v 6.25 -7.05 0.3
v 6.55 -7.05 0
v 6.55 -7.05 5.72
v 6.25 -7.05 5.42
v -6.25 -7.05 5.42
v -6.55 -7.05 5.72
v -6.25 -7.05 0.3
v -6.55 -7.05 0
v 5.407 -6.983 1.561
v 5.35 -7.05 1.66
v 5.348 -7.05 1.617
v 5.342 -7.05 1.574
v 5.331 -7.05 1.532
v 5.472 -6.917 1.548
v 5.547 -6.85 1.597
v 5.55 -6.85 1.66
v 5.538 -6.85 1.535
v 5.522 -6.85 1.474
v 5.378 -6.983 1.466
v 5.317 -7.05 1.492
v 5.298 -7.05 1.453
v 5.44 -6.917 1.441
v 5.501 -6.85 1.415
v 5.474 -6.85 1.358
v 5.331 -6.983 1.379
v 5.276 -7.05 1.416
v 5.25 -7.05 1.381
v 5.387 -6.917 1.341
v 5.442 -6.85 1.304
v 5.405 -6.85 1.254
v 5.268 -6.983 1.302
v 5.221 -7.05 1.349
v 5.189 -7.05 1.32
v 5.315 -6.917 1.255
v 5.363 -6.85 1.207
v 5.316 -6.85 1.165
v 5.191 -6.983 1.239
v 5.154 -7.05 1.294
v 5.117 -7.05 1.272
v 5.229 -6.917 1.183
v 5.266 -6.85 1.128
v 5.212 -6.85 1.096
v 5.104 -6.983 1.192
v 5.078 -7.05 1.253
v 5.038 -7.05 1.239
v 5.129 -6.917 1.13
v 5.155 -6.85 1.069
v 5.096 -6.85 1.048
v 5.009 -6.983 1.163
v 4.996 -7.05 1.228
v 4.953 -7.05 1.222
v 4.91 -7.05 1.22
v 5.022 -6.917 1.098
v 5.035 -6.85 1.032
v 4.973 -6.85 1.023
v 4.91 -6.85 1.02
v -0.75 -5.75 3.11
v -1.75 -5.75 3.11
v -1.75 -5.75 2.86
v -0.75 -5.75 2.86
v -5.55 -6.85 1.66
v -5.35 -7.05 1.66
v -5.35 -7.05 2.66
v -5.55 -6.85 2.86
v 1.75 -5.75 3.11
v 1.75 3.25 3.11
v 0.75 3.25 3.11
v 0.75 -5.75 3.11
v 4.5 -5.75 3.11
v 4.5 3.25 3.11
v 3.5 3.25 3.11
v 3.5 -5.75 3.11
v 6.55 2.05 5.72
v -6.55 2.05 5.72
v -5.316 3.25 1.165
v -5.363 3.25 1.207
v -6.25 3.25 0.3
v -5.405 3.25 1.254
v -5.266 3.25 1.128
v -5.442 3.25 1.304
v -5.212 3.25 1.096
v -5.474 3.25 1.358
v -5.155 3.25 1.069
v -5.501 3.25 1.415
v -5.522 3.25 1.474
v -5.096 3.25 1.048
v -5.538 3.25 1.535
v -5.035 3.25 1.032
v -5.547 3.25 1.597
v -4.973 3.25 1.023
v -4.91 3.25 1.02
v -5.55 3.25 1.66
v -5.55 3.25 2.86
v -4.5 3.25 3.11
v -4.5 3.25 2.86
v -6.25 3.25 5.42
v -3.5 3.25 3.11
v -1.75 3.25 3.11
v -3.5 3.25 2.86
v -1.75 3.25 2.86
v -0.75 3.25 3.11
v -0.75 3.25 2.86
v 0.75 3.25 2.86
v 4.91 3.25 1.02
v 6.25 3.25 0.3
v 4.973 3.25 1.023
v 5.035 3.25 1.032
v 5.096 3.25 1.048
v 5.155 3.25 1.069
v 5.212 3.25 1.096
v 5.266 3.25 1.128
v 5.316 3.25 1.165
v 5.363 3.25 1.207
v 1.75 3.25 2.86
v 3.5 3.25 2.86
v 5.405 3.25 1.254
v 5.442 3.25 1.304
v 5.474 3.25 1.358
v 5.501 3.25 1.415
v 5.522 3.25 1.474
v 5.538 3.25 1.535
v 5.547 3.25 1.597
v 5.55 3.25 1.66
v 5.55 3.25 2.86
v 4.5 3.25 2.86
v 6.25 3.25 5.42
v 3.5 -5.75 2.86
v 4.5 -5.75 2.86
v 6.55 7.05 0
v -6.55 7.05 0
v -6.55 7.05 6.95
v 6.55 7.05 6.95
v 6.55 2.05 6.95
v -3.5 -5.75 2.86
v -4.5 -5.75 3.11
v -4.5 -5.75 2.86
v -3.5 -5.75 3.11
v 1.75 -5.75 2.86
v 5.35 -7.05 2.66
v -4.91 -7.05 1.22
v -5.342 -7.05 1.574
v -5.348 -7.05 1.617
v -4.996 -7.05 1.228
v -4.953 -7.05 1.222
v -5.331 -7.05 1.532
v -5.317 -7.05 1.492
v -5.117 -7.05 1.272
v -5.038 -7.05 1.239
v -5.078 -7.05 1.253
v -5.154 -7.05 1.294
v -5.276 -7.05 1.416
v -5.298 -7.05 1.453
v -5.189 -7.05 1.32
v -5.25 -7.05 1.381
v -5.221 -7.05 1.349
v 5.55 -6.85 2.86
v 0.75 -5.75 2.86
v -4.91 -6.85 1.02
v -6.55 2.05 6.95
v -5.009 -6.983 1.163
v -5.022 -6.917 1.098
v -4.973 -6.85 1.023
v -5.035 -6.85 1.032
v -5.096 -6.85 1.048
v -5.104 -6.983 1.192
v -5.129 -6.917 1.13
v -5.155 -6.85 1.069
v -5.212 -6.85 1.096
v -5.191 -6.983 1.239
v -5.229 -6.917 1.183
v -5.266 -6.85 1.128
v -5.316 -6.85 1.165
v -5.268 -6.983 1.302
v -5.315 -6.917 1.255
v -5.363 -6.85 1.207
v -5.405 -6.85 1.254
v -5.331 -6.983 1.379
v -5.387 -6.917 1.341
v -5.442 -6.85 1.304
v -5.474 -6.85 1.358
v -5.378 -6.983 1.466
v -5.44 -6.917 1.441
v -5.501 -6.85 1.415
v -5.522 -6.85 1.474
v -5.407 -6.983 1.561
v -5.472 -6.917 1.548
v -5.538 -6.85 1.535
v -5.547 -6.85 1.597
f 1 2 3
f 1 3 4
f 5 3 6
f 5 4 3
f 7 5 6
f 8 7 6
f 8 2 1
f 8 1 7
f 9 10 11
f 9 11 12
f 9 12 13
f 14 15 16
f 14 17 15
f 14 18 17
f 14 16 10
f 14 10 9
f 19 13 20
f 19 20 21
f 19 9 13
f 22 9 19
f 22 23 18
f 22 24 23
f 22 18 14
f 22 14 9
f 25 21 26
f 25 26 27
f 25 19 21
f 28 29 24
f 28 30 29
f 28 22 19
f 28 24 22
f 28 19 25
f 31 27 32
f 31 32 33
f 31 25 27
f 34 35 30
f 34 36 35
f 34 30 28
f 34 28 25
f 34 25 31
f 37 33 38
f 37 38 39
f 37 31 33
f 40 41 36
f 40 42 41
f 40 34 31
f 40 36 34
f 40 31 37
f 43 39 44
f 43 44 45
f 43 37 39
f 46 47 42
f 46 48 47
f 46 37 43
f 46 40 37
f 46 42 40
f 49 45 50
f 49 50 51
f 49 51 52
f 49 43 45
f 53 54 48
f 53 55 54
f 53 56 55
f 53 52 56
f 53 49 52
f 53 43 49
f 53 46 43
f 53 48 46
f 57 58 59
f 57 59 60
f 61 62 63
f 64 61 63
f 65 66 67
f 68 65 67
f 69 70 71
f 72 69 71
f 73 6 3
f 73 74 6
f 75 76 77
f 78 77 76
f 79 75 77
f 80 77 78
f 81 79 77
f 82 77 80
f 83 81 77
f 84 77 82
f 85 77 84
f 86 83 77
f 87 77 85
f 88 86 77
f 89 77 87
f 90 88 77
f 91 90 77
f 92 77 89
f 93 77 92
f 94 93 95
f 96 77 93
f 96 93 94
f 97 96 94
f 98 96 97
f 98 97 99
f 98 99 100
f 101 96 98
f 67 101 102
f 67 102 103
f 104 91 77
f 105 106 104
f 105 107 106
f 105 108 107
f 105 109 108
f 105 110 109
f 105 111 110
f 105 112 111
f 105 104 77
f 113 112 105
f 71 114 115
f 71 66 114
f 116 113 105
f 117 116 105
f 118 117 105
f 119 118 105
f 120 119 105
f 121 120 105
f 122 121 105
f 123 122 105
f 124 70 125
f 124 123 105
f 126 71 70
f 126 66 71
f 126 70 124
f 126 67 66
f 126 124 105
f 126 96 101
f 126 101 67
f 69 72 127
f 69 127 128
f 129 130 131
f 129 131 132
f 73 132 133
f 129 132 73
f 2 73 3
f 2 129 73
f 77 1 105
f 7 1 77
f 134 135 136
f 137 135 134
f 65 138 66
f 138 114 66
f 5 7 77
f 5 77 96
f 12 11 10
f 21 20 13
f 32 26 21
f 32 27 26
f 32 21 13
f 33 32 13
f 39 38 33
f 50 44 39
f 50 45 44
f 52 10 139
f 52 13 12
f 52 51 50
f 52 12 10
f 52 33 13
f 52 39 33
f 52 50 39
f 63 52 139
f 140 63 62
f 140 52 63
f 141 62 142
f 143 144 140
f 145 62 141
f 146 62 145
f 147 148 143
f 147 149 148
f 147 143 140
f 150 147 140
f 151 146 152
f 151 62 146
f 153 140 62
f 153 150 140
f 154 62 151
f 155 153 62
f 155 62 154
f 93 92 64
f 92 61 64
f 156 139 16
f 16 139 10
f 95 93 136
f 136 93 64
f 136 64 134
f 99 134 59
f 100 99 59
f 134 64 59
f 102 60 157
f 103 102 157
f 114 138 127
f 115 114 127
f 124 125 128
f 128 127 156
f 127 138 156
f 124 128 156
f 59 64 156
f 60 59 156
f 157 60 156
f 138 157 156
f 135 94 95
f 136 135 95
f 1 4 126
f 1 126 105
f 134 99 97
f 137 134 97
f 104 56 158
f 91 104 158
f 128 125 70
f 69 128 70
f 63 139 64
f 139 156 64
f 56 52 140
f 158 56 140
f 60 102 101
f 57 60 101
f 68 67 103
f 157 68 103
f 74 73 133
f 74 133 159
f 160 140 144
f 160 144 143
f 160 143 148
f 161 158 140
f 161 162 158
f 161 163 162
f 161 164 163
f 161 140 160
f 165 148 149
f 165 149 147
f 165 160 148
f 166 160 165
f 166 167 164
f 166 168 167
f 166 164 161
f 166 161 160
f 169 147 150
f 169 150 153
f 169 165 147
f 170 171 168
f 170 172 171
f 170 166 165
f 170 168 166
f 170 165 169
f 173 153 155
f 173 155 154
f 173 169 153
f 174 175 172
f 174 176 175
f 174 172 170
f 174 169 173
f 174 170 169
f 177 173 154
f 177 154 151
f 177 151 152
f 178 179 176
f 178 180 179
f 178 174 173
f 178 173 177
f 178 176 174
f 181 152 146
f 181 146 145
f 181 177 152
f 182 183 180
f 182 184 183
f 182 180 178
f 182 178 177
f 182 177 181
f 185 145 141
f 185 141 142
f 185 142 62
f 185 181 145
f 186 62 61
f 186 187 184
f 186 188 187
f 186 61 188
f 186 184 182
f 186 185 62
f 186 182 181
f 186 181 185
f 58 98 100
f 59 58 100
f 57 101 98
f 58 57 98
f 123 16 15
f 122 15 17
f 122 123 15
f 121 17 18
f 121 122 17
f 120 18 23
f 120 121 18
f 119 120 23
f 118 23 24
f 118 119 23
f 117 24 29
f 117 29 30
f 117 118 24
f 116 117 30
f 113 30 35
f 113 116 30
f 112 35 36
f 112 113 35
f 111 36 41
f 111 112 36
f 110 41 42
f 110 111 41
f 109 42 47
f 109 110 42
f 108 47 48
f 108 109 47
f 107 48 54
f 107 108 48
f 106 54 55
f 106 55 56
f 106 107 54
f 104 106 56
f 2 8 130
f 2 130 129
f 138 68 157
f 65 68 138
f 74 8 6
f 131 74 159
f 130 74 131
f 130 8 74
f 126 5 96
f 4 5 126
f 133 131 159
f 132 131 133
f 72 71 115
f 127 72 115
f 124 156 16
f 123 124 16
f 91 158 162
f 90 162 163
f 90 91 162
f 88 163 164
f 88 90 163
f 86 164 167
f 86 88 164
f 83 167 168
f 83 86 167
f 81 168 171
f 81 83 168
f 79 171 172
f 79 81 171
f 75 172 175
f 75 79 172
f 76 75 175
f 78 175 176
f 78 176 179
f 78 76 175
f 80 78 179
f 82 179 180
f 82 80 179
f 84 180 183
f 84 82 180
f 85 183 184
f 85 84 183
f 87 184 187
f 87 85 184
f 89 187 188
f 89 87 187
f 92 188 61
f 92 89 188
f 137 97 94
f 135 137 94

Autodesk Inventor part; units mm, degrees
ref_plane "YZ Plane" through (0, 0, 0) normal (1, 0, 0) x (0, 1, 0)
ref_plane "XZ Plane" through (0, 0, 0) normal (0, 1, 0) x (-1, 0, 0)
ref_plane "XY Plane" through (0, 0, 0) normal (0, 0, 1) x (1, 0, 0)
sketch "Sketch1" plane through (0, 0, 0) normal (0, 0, 1) x (1, 0, 0)
  line L0 (-6.55, 7.05) -> (6.55, 7.05)
  line L1 (6.55, 7.05) -> (6.55, -7.05)
  line L2 (6.55, -7.05) -> (-6.55, -7.05)
  line L3 (-6.55, -7.05) -> (-6.55, 7.05)
  point P0 (0, 0)
  point P1 (-6.55, 0)
  point P2 (0, 7.05)
  dimension "d0" = 13.1
  dimension "d1" = 14.1
extrude "Extrusion1" add sketch "Sketch1" along normal blind 5.72
sketch "Sketch2" plane through (0, 0, 5.72) normal (0, 0, 1) x (1, 0, 0)
  line L0 (6.55, 7.05) -> (6.55, -7.05) projected
  line L1 (-6.55, 7.05) -> (6.55, 7.05)
  line L2 (6.55, 7.05) -> (6.55, 2.05)
  line L3 (6.55, 2.05) -> (-6.55, 2.05)
  line L4 (-6.55, 2.05) -> (-6.55, 7.05)
  point P0 (0, 0)
  dimension "d4" = 5
extrude "Extrusion2" add sketch "Sketch2" along normal blind 1.23
sketch "Sketch3" plane through (-6.55, -7.05, 0) normal (0, -1, 0) x (1, 0, 0)
  line L0 (13.1, 5.72) -> (0, 5.72) projected
  line L1 (0, 0) -> (0, 5.72) projected
  line L2 (13.1, 0) -> (0, 0) projected
  line L3 (13.1, 0) -> (13.1, 5.72) projected
  line L4 (0.3, 5.42) -> (12.8, 5.42)
  line L5 (12.8, 5.42) -> (12.8, 0.3)
  line L6 (12.8, 0.3) -> (0.3, 0.3)
  line L7 (0.3, 0.3) -> (0.3, 5.42)
  line L8 (1, 2.86) -> (12.1, 2.86)
  line L9 (12.1, 2.86) -> (12.1, 1.02)
  line L10 (12.1, 1.02) -> (1, 1.02)
  line L11 (1, 1.02) -> (1, 2.86)
  line L12 (2.05, 2.86) -> (3.05, 2.86)
  line L13 (4.8, 2.86) -> (5.8, 2.86)
  line L14 (7.3, 2.86) -> (8.3, 2.86)
  line L15 (10.05, 2.86) -> (11.05, 2.86)
  point P0 (6.55, 0)
  dimension "d7" = 0.3
  dimension "d9" = 5.72
  dimension "d10" = 5.12
  dimension "d11" = 0.7
  dimension "d13" = 1.84
  dimension "d14" = 0.7
  dimension "d17" = 2.56
extrude "Extrusion3" cut sketch "Sketch3" against normal blind 10.3 contours L4 L5 L6 L7
fillet "Fillet3" radius 0.64 1 edges at (5.55, -1.9, 1.02)
fillet "Fillet4" radius 0.64 1 edges at (-5.55, -1.9, 1.02)
chamfer "Chamfer1" distance 0.2 angle 45 5 edges at (5.55, -7.05, 2.26) (5.3625, -7.05, 1.2075) (0, -7.05, 1.02) (-5.3625, -7.05, 1.2075) (-5.55, -7.05, 2.26)
chamfer "Chamfer7" distance 0.2 angle 45 1 edges at (0, -7.05, 2.86)
sketch "Sketch4" plane through (-6.55, 3.25, 0) normal (0, -1, 0) x (1, 0, 0)
  line L0 (12.1, 2.86) -> (1, 2.86) projected
  line L1 (12.1, 1.66) -> (12.1, 2.86) projected
  line L2 (2.05, 2.86) -> (3.05, 2.86)
  line L3 (3.05, 2.86) -> (3.05, 3.11)
  line L4 (3.05, 3.11) -> (2.05, 3.11)
  line L5 (2.05, 3.11) -> (2.05, 2.86)
  line L6 (4.8, 2.86) -> (5.8, 2.86)
  line L7 (5.8, 2.86) -> (5.8, 3.11)
  line L8 (5.8, 3.11) -> (4.8, 3.11)
  line L9 (4.8, 3.11) -> (4.8, 2.86)
  line L10 (7.3, 2.86) -> (8.3, 2.86)
  line L11 (8.3, 2.86) -> (8.3, 3.11)
  line L12 (8.3, 3.11) -> (7.3, 3.11)
  line L13 (7.3, 3.11) -> (7.3, 2.86)
  line L14 (10.05, 2.86) -> (11.05, 2.86)
  line L15 (11.05, 2.86) -> (11.05, 3.11)
  line L16 (11.05, 3.11) -> (10.05, 3.11)
  line L17 (10.05, 3.11) -> (10.05, 2.86)
  point P0 (6.55, 0)
  dimension "d57" = 1
  dimension "d58" = 1
  dimension "d59" = 1
  dimension "d60" = 1
  dimension "d61" = 0.25
  dimension "d62" = 0.25
  dimension "d63" = 0.25
  dimension "d64" = 0.25
  dimension "d65" = 1.5
  dimension "d66" = 1.75
  dimension "d67" = 1.75
  dimension "d68" = 1.05
extrude "Extrusion5" add sketch "Sketch4" along normal blind 9
properties part number "usb host con"
